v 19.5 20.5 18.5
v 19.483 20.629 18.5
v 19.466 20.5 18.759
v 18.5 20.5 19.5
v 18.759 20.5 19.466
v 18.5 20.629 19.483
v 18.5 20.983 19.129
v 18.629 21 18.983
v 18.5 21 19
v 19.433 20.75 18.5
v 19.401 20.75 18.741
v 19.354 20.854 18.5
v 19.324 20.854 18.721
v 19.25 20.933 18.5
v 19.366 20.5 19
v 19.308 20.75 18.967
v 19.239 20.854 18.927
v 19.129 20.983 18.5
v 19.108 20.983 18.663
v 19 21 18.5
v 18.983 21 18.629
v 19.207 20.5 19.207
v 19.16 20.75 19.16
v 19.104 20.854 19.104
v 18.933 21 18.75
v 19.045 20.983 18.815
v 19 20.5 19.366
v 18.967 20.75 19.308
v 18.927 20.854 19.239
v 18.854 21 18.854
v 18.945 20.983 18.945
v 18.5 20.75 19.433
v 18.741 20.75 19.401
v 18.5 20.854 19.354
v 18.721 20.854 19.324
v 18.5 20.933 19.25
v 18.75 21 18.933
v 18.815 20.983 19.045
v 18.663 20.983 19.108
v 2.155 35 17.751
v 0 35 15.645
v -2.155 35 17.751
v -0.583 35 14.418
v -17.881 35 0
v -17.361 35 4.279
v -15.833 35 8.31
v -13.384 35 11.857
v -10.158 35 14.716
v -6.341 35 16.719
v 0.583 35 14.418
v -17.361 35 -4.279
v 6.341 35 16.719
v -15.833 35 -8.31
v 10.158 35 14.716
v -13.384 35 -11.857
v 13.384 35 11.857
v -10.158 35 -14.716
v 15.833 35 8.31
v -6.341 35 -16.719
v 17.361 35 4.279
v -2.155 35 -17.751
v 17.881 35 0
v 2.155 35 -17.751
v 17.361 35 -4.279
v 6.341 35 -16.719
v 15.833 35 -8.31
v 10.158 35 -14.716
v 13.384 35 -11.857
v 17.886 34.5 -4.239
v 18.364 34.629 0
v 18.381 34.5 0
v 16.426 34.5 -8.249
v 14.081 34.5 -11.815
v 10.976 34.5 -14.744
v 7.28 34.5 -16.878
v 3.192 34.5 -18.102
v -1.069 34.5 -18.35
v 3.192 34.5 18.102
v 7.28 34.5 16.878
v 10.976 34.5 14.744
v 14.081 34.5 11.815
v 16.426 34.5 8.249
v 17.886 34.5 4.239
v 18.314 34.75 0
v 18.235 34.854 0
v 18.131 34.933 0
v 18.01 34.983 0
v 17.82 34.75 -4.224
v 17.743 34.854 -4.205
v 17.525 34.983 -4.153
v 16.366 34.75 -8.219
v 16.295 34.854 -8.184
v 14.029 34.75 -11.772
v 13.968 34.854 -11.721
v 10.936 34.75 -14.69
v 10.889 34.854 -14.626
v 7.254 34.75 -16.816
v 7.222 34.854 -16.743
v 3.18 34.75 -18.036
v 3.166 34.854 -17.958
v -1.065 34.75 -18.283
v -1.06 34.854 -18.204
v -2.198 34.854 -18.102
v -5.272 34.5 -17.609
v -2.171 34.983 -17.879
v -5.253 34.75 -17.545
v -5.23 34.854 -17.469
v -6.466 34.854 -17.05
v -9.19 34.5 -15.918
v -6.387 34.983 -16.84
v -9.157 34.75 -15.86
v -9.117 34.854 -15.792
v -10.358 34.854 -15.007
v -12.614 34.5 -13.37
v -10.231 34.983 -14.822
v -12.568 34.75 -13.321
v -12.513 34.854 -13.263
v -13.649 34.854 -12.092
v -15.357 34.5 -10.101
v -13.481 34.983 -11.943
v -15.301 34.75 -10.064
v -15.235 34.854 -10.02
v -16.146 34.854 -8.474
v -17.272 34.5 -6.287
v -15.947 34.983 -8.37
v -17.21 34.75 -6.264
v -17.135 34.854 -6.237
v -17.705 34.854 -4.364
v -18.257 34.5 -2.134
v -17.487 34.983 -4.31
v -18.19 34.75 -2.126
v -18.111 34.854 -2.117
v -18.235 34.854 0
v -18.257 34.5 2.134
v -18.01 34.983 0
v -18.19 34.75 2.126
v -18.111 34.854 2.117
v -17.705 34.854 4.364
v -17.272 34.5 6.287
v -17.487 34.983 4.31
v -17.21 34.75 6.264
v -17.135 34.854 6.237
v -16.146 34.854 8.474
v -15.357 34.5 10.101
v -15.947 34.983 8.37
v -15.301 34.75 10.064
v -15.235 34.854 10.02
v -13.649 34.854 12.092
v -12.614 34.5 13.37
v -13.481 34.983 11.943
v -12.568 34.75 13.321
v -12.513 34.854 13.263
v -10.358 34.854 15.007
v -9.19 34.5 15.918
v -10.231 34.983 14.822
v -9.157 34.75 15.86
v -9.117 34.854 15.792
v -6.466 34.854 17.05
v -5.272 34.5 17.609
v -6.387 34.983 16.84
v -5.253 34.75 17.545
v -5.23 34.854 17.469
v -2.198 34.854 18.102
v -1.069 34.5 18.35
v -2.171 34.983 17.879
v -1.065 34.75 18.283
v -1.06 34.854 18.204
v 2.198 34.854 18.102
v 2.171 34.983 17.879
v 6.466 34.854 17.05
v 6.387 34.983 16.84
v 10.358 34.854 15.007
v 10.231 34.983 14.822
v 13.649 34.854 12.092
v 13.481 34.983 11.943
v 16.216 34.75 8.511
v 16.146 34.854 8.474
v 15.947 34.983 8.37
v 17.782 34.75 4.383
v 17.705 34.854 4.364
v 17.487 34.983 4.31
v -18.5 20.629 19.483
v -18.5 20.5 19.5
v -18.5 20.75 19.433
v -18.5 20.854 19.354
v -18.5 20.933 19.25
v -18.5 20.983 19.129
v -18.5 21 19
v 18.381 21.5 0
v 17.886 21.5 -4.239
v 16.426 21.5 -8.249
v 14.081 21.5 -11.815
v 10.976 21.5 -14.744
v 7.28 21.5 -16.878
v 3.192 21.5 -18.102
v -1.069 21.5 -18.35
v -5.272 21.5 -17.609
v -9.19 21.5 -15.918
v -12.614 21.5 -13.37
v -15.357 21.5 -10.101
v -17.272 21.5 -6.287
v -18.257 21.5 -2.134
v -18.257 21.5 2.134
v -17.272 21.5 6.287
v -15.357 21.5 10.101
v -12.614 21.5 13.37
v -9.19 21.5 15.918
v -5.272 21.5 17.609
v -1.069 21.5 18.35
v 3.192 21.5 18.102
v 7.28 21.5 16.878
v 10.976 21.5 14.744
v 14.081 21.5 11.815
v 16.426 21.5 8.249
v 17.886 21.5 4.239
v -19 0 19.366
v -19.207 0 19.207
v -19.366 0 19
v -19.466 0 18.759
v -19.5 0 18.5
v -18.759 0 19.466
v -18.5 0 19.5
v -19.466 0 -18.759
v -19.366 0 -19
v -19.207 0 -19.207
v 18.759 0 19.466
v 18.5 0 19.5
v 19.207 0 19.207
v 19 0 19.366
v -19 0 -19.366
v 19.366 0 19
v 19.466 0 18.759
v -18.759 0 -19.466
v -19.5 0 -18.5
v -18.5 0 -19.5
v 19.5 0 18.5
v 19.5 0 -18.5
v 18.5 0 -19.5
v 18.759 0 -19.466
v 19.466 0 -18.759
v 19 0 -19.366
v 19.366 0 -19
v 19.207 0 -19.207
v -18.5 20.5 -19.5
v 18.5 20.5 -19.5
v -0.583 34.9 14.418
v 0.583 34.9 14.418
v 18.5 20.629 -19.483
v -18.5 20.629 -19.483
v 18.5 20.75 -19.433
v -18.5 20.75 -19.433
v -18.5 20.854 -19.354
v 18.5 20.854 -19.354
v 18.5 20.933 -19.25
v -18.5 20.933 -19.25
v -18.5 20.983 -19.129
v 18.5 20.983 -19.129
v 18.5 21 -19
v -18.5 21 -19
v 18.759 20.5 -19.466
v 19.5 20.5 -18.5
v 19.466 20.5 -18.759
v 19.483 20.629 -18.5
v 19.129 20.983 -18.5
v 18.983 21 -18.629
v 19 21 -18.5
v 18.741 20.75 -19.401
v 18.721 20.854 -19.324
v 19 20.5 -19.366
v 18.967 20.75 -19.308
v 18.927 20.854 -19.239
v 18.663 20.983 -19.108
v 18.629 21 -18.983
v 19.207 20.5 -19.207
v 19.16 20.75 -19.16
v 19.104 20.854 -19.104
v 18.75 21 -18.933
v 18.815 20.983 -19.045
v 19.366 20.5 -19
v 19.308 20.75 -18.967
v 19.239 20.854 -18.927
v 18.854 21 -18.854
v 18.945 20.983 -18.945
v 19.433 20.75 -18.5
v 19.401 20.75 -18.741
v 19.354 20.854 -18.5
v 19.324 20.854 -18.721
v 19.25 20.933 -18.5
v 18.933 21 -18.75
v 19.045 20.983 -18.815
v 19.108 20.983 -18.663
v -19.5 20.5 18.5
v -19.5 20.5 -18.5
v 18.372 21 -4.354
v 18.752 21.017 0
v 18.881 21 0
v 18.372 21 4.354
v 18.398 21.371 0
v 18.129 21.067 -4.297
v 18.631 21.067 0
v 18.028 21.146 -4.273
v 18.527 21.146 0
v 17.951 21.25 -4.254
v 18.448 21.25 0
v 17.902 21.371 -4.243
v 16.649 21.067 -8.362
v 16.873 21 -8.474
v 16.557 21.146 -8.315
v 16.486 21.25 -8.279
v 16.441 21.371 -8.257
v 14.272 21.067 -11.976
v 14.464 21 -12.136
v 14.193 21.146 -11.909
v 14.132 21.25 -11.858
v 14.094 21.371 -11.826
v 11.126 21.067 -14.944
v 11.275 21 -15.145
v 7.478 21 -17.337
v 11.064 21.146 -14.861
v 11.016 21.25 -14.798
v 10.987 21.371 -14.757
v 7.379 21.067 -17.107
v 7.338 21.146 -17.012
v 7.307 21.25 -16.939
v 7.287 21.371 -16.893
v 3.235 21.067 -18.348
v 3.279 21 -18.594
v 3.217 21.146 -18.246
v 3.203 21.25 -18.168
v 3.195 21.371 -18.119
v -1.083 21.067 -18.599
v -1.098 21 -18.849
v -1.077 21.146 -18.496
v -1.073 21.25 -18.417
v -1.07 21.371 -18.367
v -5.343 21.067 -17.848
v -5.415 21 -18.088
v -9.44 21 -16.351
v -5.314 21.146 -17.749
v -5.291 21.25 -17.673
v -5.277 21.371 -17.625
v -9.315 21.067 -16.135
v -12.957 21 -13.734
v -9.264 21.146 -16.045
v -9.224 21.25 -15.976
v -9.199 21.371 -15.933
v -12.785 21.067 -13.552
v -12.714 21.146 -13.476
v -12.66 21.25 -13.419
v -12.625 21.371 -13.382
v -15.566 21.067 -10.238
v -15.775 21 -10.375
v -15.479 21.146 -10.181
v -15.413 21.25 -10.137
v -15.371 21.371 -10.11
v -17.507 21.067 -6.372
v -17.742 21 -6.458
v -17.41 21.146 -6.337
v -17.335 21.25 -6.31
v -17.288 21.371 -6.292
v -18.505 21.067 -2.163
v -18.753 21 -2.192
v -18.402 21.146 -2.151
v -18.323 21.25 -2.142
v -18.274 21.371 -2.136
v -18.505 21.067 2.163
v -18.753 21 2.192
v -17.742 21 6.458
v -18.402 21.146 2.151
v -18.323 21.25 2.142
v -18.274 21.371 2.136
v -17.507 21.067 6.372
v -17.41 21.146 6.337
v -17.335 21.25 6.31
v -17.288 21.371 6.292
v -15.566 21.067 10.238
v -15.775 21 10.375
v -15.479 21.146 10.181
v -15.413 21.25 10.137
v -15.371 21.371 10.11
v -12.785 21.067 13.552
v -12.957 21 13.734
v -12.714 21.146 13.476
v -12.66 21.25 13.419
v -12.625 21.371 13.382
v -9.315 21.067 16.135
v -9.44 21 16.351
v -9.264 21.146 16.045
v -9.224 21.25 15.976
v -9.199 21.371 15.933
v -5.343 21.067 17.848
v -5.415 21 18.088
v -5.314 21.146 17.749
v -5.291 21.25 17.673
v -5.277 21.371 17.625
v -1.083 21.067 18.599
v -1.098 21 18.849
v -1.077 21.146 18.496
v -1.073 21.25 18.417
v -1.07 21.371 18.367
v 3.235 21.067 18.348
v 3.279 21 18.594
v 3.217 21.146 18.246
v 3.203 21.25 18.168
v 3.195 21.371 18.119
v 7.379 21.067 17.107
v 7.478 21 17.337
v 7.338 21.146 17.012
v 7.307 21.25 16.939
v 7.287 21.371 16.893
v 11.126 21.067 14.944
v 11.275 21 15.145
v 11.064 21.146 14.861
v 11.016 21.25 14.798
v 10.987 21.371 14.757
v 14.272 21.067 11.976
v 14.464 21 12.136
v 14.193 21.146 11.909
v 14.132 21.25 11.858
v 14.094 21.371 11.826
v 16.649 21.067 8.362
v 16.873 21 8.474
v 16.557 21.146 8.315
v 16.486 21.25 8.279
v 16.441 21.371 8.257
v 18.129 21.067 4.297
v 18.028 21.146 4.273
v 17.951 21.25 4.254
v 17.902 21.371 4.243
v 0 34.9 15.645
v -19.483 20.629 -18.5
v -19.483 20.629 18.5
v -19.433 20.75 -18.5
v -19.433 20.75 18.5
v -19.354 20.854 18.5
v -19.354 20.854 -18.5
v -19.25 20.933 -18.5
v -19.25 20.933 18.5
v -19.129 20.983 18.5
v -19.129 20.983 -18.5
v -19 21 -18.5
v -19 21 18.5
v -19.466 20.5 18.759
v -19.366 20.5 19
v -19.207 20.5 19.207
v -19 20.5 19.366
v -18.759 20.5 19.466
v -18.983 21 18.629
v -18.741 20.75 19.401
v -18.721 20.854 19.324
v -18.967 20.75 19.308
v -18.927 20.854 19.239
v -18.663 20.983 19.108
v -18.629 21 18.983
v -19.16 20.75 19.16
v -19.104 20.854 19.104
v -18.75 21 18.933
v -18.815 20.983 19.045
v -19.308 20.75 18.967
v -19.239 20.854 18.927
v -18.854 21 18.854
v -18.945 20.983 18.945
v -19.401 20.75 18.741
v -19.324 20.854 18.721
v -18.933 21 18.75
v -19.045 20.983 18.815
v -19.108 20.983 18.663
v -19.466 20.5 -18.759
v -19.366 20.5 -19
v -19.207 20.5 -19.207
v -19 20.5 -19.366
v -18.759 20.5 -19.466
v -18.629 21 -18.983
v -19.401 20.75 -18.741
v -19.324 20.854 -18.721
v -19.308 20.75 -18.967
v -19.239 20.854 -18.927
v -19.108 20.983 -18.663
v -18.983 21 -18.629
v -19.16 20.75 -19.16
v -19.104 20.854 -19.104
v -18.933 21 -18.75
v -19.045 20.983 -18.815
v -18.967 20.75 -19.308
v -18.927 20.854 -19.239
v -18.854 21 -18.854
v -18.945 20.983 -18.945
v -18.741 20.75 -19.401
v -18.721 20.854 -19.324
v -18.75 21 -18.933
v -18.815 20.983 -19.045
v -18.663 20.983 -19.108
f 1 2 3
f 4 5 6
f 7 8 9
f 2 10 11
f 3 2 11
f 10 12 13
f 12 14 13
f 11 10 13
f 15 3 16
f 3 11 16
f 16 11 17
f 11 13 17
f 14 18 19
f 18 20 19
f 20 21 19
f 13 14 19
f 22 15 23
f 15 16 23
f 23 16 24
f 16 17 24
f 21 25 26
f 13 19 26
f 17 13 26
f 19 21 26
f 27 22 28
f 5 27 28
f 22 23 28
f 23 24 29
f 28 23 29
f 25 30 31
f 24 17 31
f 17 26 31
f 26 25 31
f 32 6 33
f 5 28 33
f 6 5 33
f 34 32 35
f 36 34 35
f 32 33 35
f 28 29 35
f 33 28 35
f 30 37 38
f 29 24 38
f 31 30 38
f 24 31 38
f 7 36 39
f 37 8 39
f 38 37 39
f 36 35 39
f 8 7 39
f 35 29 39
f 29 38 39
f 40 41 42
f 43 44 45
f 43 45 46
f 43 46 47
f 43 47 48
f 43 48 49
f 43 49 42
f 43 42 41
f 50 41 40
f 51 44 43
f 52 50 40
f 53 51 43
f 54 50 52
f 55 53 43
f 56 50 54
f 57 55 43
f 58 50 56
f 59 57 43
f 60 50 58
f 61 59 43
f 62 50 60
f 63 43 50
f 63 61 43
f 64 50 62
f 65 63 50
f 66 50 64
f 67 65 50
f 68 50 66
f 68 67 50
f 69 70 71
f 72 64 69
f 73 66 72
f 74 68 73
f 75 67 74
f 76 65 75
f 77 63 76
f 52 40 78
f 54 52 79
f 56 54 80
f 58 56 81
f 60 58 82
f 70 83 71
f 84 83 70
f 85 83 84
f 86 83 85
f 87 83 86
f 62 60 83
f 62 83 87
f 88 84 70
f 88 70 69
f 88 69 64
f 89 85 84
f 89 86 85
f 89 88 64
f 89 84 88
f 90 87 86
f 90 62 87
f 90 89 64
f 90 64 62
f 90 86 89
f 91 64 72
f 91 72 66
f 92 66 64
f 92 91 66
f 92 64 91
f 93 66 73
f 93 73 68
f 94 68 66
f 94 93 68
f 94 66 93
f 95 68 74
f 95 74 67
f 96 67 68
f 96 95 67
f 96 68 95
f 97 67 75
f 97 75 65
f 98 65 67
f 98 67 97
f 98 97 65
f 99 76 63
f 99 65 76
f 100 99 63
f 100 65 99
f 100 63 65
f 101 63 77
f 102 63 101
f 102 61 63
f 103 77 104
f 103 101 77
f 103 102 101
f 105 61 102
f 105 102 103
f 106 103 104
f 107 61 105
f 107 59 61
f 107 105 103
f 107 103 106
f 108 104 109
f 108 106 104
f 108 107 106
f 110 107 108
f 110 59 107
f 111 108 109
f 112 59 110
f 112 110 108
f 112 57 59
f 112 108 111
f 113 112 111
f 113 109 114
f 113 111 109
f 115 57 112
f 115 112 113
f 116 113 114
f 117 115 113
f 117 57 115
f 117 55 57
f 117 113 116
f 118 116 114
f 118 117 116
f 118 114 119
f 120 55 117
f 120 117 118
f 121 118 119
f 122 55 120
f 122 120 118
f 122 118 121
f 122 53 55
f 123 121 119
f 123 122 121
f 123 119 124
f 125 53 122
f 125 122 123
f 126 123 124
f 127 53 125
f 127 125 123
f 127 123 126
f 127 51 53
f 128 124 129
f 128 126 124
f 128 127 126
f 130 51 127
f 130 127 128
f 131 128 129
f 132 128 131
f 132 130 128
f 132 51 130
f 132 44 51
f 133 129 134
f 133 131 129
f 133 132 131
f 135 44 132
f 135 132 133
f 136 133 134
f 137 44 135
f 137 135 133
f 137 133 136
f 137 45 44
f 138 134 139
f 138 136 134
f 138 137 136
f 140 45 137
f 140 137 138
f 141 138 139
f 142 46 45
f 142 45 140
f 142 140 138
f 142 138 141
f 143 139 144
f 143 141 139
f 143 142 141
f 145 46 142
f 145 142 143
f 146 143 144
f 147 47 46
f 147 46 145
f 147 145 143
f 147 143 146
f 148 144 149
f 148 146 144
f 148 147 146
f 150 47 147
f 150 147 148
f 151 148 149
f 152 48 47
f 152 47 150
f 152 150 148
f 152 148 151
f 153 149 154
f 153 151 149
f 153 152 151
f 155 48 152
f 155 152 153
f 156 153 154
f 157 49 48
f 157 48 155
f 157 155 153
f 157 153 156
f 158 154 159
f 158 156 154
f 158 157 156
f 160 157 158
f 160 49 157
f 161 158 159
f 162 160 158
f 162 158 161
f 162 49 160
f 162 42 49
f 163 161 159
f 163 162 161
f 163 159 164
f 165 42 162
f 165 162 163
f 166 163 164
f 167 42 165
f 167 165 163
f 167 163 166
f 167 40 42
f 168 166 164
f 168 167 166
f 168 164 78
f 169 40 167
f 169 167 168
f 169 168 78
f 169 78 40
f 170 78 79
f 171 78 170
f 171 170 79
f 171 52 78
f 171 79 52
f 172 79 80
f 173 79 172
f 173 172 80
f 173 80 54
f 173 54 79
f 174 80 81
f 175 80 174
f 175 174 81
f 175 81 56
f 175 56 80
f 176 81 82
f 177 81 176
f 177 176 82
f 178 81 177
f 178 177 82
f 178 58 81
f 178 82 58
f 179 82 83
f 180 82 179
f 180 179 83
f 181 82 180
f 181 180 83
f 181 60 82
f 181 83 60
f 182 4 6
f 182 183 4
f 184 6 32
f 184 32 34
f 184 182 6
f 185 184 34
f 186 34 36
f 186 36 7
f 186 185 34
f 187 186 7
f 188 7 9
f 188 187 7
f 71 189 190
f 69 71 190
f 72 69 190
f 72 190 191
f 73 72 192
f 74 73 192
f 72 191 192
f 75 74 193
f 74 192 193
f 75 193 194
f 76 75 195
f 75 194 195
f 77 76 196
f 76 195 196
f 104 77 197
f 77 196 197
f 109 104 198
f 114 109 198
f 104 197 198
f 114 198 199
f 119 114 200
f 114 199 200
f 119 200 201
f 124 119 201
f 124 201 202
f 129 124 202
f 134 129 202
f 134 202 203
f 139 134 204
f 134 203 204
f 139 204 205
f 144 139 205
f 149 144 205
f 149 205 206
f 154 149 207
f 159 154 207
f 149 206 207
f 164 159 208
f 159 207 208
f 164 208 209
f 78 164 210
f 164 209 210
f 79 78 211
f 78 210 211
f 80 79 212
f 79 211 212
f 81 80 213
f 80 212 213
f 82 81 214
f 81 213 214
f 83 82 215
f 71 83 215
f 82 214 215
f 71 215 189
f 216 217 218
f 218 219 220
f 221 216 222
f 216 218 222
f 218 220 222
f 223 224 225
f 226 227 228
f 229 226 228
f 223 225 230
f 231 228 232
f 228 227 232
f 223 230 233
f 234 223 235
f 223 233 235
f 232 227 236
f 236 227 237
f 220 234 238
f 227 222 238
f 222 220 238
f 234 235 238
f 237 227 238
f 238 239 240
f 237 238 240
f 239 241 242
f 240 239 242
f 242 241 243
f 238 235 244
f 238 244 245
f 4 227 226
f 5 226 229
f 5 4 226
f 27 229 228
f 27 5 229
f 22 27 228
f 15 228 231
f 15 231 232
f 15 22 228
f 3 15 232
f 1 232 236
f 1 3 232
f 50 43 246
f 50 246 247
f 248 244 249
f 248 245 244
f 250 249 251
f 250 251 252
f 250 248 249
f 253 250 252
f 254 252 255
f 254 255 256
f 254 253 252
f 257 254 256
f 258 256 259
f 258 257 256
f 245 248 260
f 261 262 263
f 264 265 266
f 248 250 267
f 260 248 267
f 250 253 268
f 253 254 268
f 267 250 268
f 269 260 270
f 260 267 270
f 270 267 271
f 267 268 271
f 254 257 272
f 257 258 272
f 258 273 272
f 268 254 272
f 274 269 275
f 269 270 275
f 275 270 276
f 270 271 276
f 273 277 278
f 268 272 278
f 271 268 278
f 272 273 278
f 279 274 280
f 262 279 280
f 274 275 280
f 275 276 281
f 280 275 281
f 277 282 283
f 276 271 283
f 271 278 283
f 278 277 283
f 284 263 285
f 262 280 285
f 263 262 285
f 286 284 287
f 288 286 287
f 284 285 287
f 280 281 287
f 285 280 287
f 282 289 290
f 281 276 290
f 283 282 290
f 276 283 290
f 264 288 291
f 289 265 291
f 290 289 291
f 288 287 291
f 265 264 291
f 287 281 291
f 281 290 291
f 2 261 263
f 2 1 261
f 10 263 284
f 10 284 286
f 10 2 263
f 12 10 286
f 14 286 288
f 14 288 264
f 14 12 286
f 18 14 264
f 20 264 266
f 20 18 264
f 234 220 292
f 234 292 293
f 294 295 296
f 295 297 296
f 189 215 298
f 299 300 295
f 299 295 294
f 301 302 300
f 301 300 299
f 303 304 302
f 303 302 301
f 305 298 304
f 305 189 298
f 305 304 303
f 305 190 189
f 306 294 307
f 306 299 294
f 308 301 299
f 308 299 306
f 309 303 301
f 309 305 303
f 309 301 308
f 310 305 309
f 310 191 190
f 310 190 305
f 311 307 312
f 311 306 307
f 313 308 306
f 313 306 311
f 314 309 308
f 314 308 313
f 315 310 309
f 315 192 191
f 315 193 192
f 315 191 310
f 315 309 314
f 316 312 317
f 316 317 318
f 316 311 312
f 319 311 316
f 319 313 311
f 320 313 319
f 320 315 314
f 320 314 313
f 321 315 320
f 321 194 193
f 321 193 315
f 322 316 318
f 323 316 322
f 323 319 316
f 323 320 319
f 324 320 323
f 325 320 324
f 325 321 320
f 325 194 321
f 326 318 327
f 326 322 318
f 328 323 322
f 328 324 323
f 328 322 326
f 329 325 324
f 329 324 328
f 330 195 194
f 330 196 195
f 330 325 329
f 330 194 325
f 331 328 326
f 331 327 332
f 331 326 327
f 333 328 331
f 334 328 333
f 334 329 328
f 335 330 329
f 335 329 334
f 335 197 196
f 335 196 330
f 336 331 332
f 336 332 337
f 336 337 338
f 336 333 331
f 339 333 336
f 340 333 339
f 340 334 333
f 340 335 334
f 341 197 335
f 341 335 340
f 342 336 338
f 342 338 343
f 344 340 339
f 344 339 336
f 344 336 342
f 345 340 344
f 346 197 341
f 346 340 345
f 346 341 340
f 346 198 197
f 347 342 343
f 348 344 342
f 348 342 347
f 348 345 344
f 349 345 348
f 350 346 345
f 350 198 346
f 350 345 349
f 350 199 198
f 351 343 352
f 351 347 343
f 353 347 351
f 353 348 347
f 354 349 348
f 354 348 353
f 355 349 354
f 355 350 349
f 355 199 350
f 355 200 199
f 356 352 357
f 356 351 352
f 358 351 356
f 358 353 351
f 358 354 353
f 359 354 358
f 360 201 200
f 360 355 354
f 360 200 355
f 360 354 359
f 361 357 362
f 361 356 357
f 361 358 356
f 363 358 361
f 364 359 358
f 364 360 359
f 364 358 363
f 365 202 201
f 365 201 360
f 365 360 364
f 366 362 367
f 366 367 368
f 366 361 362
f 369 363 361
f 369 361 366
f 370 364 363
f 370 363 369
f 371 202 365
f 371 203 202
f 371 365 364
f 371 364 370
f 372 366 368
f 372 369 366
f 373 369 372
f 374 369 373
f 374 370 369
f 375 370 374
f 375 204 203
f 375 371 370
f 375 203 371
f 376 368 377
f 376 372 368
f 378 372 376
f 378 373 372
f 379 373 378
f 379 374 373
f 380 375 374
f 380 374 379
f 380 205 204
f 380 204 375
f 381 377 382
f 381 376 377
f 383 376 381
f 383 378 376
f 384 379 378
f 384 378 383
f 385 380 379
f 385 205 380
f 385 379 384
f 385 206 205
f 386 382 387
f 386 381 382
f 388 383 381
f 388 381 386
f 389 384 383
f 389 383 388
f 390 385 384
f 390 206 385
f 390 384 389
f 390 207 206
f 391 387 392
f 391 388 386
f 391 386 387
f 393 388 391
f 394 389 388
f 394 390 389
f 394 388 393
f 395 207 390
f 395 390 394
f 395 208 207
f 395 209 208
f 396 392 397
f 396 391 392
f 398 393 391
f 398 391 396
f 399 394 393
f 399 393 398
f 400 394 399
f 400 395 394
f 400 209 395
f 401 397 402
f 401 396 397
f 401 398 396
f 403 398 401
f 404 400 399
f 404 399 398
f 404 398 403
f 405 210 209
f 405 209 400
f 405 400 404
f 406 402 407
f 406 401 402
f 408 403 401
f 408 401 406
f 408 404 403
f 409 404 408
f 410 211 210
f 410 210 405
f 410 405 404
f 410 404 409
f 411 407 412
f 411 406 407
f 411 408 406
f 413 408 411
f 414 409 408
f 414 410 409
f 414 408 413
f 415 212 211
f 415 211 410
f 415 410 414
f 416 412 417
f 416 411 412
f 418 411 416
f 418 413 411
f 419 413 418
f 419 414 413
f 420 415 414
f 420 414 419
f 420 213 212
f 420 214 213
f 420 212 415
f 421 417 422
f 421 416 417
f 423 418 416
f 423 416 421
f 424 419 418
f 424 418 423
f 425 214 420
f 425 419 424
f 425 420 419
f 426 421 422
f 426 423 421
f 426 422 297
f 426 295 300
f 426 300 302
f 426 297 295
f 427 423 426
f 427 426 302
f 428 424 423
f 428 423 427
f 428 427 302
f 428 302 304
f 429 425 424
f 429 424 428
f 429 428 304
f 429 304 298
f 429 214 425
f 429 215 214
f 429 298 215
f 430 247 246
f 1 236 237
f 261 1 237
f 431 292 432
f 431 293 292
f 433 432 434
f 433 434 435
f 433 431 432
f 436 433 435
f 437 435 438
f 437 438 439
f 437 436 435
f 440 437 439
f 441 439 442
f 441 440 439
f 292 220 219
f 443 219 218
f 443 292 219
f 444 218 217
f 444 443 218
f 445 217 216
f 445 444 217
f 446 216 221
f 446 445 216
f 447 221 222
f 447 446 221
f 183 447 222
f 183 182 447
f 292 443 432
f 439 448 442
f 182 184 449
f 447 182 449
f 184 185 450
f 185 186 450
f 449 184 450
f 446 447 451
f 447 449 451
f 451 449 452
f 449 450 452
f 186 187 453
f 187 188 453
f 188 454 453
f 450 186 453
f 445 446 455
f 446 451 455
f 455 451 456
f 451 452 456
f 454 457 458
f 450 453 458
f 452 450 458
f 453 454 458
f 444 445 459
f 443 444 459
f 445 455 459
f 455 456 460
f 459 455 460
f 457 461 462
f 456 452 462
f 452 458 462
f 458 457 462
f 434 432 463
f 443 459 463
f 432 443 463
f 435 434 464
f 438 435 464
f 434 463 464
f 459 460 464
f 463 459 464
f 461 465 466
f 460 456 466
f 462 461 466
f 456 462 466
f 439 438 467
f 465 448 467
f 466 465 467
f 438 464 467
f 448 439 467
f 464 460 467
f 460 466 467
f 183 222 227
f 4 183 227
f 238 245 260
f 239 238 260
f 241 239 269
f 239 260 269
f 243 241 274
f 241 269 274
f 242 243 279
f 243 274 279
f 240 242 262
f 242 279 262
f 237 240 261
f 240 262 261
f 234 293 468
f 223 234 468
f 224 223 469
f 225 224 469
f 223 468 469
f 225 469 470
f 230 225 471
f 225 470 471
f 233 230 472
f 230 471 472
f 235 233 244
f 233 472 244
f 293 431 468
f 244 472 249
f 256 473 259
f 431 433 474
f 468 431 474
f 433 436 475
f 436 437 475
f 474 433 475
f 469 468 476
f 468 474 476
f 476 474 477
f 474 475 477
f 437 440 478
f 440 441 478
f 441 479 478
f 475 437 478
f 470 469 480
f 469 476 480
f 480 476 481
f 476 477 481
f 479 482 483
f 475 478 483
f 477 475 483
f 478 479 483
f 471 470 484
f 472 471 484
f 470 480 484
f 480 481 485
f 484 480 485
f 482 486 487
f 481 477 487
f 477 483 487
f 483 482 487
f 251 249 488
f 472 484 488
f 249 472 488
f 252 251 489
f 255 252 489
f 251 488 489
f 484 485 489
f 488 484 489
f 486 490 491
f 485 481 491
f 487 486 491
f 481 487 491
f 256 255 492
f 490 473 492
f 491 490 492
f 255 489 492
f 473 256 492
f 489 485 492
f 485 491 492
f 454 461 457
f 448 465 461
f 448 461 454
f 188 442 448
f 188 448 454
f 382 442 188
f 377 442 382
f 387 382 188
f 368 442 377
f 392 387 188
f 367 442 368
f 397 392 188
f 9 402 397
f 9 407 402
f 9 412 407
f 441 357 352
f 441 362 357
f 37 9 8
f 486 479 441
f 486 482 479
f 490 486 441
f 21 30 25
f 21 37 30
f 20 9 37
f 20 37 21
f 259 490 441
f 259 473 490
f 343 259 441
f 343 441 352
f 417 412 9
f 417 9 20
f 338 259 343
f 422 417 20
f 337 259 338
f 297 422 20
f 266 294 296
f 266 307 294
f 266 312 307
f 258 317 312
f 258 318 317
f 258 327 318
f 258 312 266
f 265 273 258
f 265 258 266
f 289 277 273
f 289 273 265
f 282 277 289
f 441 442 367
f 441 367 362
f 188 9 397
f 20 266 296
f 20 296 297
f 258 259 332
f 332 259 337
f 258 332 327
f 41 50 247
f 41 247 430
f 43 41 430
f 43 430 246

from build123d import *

# Parameters (mm, degrees)
SKETCH_1_W          = 39
SKETCH_1_H          = 39
EXTRUDE_1_DEPTH     = 21
SKETCH_2_R          = 18.38099713
EXTRUDE_2_DEPTH     = 14
FILLET_1_R          = 1
FILLET_2_R          = 0.5
CUT_EXTRUDE_1_DEPTH = 0.1


with BuildPart() as part:
    # 草图1 → 凸台-拉伸1 (new body)
    with BuildSketch(Plane(origin=(0, 0, 0), x_dir=(1, 0, 0), z_dir=(0, 1, 0))):
        Rectangle(SKETCH_1_W, SKETCH_1_H)
    extrude(amount=EXTRUDE_1_DEPTH)

    # 草图2 → 凸台-拉伸2 (add)
    with BuildSketch(Plane(origin=(0, 21, 0), x_dir=(1, 0, 0), z_dir=(0, 1, 0))):
        Circle(SKETCH_2_R)
    extrude(amount=EXTRUDE_2_DEPTH)

    # 圆角1
    fillet_1_edges = [part.edges().sort_by_distance(p)[0] for p in [
        (19.5, 10.5, 19.5),
        (-19.5, 10.5, 19.5),
        (-19.5, 10.5, -19.5),
        (19.5, 10.5, -19.5),
    ]]
    fillet(fillet_1_edges, radius=FILLET_1_R)

    # 圆角2
    fillet_2_edges = [part.edges().sort_by_distance(p)[0] for p in [
        (-18.38099713, 21, 0),
        (-18.38099713, 35, 0),
        (-19.5, 21, 0),
        (0, 21, -19.5),
        (19.5, 21, 0),
        (0, 21, 19.5),
        (19.207106781, 21, -19.207106781),
        (19.207106781, 21, 19.207106781),
        (-19.207106781, 21, 19.207106781),
        (-19.207106781, 21, -19.207106781),
    ]]
    fillet(fillet_2_edges, radius=FILLET_2_R)

    # 草图3 → 切除-拉伸1 (cut)
    with BuildSketch(Plane(origin=(0, 35, 0), x_dir=(1, 0, 0), z_dir=(0, 1, 0))):
        Polygon((0, -15.64459956), (-0.583250004, -14.417555177), (0.583250004, -14.417555177), align=None)
    extrude(amount=-CUT_EXTRUDE_1_DEPTH, mode=Mode.SUBTRACT)


solid = part.part
